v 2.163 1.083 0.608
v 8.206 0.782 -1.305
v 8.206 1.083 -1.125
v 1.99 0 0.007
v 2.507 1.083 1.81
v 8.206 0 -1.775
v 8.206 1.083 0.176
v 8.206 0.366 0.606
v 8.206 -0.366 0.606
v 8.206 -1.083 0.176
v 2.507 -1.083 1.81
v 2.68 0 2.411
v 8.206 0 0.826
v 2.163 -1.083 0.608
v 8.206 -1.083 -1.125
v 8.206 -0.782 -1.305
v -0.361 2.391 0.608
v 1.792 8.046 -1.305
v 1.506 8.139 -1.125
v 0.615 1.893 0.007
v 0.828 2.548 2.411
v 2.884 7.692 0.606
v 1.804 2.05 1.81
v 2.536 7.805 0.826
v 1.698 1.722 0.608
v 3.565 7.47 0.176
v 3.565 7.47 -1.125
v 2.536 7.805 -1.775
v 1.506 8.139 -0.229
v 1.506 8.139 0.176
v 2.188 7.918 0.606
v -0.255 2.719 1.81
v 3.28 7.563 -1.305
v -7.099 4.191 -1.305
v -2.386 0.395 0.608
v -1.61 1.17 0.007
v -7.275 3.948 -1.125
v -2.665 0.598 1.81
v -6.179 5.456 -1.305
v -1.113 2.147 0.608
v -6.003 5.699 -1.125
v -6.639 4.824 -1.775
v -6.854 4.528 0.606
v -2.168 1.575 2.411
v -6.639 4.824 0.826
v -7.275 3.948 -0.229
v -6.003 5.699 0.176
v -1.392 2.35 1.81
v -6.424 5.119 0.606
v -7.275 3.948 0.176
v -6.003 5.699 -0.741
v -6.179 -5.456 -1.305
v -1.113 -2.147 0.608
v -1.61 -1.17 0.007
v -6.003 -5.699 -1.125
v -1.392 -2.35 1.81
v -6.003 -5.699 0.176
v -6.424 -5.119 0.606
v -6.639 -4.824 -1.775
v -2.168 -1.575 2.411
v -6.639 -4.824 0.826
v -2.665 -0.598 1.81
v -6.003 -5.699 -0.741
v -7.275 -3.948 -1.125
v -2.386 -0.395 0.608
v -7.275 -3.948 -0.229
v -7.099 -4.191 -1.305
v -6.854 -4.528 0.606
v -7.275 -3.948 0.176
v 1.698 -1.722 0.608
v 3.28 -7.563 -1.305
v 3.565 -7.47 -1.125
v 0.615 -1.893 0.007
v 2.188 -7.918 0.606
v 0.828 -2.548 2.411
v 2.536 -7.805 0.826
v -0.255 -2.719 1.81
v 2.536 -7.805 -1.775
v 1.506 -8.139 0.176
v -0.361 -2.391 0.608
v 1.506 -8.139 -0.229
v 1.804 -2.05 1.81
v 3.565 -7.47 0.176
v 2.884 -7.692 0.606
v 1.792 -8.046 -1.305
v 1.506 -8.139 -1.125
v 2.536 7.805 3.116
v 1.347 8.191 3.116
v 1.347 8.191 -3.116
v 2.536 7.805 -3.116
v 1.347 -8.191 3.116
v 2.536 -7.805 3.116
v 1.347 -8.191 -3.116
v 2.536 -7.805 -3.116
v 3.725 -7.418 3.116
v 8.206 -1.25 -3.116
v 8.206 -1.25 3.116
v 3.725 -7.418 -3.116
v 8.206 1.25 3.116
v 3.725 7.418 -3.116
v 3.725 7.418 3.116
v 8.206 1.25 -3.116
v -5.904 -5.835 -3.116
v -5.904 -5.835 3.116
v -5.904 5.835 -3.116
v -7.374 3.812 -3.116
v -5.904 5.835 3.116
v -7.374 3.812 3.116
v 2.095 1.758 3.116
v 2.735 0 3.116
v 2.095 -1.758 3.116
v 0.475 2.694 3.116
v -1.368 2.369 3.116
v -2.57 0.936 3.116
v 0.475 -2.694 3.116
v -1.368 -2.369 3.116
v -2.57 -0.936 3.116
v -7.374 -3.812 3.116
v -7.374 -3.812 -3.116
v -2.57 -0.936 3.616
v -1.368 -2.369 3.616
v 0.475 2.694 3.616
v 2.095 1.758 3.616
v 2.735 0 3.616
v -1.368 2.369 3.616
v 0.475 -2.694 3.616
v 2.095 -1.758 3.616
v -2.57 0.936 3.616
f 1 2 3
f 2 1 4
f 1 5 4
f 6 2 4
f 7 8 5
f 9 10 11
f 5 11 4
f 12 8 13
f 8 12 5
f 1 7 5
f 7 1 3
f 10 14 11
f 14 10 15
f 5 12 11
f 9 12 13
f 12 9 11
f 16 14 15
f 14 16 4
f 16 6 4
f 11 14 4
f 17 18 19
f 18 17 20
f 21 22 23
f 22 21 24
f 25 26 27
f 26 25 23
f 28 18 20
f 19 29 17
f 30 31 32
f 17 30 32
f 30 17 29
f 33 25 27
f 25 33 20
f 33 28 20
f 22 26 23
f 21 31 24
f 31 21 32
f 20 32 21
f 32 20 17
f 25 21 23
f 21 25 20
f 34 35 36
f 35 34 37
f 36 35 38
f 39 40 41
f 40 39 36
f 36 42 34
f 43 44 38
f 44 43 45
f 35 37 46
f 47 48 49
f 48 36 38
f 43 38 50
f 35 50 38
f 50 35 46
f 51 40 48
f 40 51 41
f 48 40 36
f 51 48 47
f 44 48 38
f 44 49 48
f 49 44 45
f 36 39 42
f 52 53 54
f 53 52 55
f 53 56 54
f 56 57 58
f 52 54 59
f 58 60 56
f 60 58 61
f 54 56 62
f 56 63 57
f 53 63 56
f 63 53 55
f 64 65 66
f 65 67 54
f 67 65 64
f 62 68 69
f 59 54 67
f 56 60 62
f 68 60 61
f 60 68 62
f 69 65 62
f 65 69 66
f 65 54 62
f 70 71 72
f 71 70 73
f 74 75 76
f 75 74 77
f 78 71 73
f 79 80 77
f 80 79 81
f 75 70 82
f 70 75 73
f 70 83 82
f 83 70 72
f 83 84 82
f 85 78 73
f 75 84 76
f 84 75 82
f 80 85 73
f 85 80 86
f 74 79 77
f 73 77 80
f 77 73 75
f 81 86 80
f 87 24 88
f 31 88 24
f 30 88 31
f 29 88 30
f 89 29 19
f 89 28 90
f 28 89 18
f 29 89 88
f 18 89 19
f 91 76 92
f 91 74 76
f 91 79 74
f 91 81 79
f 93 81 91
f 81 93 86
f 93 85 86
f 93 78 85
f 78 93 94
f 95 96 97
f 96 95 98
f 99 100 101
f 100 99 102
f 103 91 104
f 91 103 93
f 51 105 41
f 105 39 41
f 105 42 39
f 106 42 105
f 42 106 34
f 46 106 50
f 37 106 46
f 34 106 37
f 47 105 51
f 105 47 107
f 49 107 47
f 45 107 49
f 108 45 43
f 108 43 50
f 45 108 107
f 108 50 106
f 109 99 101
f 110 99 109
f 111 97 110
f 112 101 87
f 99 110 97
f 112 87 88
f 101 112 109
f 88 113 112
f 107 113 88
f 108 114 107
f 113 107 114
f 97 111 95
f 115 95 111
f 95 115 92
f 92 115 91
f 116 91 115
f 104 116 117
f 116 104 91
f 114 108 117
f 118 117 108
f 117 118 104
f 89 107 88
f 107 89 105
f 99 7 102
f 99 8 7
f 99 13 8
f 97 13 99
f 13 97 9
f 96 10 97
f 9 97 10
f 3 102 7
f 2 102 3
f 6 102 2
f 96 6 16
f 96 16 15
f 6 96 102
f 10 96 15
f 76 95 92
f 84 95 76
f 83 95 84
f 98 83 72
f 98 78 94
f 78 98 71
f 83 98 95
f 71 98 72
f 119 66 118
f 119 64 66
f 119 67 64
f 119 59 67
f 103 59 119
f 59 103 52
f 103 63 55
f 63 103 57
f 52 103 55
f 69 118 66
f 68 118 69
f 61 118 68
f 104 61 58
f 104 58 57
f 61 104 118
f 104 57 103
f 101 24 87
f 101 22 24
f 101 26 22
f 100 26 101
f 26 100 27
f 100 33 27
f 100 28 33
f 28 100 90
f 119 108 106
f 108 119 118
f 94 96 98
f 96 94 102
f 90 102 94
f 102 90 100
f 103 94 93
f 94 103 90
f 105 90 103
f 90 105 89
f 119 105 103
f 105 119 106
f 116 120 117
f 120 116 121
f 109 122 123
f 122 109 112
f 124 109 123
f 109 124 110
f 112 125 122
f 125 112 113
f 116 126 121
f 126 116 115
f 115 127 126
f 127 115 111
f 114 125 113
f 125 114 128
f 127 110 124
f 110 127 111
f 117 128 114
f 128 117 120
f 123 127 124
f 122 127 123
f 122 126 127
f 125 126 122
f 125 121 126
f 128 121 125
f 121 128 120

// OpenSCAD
//---------------------------------------------------------------------------------------------
//-- Mini-dome.  Derived from the Domekit-2V from effallo
//---------------------------------------------------------------------------------------------
//-- PENTA-CONNECTORS
//-- The connectors are parameterized. The short sticks are connected
//-- in all the holes. There is a circle on the top, indicating the outer face
//---------------------------------------------------------------------------------------------
//-- (c) Jul-2012 Juan Gonzalez-Gomez (Obijuan) juan@iearobotics.com
//-- Released under the GPL license
//--------------------------------------------------------------------------------------------
/* Derived from:
   DOMEKIT-2V • PENTAGON
   http://effalo.com
*/

//-- Two Domes as examples:
//-- All the calculations have been done using this link:
//--  http://simplydifferently.org/Geodesic_Dome_Notes?page=3#2V/L2

/*  EXAMPLE 1 (default): Micro-dome

   Diameter: 150 mm
   Height: 75mm
   20 x Hexa-connectors
   6  x  Penta-connectors
   35 x Long sticks: 46.3mm (Green)
   30 x shot sticks: 41mm (Red)
*/

/*  EXAMPLE 2: Mini-dome

   Diameter: 50cm
   Height: 25cm
   20 x Hexa-connectors
   6  x  Penta-connectors
   35 x Long sticks: 154.5 mm (Green)
   30 x shot sticks: 136.6 mm (Red)
*/


//----------------------------------------------------------------------------------------------------
//--  Module for creating the main body of the pentagonal connectors
//--  Parameters:
//--      r :  Pentagon radius
//--      h:  Hub height
//--      s:  Stick diameter
//-------------------------------------------------------------------------------------------------------
module penta_hub_main(r,h,s)
{
  hull() {
    cylinder(r=r, h=h,center=true,$fn=5);

     for (i=[0:4]) {
       rotate([0,0,i*72])
         translate([r-s/2,0,0])
           cube([s,s, h],center=true);
    }
  }
}

//----------------------------------------------------------------------------------
//-- Pentagon connector
//-- Input parameters
//--     sd: stick diameter
//--     holedepth
//--
//--    The total part height and diameter are calculated 
//--   accorting to these two USER parameters
//----------------------------------------------------------------------------------
module penta_hub(sd=2.5, holedepth=6)
{
  
  //-- Temp variable. Length of the cilinders used for 
  //-- making the drills on the main hub. 

  length = holedepth + sd*sin(18)+2;

  //-- Calculate the main hub parameters: radius and height
  //-- They are calculated from the stick diameter and holedepth
  hub_r = sd + holedepth*cos(18);
  hub_h = holedepth*sin(18)+sd*cos(18) + 1+1;

  //-- Debugin: Output the calculated parameters
  echo("Diameter: ",2*hub_r);
  echo("Height: ",hub_h);

  //-- The part consist of sub-parts:
  //--  1) The main hub: a pentagon 
  //--  2) The drills 
 //--   3) A top circle

  union() {
    difference() {
      //-- Main hub
      penta_hub_main(r=hub_r, h=hub_h,s=sd);

      //-- Holes for inserting the sticks
      for (i=[0:5]) {
         rotate([0,0,i*72])
          translate([length/2+sd*sqrt(3)/2,0,0])
            rotate([0,90+16,0])
              cylinder(r=sd/2, h=length, center=true, $fn=6);
      }
    }
    //-- A cicle for indicationg the outer face of the connector
    translate([0,0,hub_h/2])
      cylinder(r=hub_r/3, h=1,center=true);

  }

} //-- End module


//-----------------------------------------------------------------------------------------
//-- DEFINED BY THE USER:
//-- uncomment the connects to use, or set the parameters
//----------------------------------------------------------------------------------------

//-- Default: Micro-dome
penta_hub();

//-- Mini Dome:
//penta_hub(sd=3.4, holedepth=10);
